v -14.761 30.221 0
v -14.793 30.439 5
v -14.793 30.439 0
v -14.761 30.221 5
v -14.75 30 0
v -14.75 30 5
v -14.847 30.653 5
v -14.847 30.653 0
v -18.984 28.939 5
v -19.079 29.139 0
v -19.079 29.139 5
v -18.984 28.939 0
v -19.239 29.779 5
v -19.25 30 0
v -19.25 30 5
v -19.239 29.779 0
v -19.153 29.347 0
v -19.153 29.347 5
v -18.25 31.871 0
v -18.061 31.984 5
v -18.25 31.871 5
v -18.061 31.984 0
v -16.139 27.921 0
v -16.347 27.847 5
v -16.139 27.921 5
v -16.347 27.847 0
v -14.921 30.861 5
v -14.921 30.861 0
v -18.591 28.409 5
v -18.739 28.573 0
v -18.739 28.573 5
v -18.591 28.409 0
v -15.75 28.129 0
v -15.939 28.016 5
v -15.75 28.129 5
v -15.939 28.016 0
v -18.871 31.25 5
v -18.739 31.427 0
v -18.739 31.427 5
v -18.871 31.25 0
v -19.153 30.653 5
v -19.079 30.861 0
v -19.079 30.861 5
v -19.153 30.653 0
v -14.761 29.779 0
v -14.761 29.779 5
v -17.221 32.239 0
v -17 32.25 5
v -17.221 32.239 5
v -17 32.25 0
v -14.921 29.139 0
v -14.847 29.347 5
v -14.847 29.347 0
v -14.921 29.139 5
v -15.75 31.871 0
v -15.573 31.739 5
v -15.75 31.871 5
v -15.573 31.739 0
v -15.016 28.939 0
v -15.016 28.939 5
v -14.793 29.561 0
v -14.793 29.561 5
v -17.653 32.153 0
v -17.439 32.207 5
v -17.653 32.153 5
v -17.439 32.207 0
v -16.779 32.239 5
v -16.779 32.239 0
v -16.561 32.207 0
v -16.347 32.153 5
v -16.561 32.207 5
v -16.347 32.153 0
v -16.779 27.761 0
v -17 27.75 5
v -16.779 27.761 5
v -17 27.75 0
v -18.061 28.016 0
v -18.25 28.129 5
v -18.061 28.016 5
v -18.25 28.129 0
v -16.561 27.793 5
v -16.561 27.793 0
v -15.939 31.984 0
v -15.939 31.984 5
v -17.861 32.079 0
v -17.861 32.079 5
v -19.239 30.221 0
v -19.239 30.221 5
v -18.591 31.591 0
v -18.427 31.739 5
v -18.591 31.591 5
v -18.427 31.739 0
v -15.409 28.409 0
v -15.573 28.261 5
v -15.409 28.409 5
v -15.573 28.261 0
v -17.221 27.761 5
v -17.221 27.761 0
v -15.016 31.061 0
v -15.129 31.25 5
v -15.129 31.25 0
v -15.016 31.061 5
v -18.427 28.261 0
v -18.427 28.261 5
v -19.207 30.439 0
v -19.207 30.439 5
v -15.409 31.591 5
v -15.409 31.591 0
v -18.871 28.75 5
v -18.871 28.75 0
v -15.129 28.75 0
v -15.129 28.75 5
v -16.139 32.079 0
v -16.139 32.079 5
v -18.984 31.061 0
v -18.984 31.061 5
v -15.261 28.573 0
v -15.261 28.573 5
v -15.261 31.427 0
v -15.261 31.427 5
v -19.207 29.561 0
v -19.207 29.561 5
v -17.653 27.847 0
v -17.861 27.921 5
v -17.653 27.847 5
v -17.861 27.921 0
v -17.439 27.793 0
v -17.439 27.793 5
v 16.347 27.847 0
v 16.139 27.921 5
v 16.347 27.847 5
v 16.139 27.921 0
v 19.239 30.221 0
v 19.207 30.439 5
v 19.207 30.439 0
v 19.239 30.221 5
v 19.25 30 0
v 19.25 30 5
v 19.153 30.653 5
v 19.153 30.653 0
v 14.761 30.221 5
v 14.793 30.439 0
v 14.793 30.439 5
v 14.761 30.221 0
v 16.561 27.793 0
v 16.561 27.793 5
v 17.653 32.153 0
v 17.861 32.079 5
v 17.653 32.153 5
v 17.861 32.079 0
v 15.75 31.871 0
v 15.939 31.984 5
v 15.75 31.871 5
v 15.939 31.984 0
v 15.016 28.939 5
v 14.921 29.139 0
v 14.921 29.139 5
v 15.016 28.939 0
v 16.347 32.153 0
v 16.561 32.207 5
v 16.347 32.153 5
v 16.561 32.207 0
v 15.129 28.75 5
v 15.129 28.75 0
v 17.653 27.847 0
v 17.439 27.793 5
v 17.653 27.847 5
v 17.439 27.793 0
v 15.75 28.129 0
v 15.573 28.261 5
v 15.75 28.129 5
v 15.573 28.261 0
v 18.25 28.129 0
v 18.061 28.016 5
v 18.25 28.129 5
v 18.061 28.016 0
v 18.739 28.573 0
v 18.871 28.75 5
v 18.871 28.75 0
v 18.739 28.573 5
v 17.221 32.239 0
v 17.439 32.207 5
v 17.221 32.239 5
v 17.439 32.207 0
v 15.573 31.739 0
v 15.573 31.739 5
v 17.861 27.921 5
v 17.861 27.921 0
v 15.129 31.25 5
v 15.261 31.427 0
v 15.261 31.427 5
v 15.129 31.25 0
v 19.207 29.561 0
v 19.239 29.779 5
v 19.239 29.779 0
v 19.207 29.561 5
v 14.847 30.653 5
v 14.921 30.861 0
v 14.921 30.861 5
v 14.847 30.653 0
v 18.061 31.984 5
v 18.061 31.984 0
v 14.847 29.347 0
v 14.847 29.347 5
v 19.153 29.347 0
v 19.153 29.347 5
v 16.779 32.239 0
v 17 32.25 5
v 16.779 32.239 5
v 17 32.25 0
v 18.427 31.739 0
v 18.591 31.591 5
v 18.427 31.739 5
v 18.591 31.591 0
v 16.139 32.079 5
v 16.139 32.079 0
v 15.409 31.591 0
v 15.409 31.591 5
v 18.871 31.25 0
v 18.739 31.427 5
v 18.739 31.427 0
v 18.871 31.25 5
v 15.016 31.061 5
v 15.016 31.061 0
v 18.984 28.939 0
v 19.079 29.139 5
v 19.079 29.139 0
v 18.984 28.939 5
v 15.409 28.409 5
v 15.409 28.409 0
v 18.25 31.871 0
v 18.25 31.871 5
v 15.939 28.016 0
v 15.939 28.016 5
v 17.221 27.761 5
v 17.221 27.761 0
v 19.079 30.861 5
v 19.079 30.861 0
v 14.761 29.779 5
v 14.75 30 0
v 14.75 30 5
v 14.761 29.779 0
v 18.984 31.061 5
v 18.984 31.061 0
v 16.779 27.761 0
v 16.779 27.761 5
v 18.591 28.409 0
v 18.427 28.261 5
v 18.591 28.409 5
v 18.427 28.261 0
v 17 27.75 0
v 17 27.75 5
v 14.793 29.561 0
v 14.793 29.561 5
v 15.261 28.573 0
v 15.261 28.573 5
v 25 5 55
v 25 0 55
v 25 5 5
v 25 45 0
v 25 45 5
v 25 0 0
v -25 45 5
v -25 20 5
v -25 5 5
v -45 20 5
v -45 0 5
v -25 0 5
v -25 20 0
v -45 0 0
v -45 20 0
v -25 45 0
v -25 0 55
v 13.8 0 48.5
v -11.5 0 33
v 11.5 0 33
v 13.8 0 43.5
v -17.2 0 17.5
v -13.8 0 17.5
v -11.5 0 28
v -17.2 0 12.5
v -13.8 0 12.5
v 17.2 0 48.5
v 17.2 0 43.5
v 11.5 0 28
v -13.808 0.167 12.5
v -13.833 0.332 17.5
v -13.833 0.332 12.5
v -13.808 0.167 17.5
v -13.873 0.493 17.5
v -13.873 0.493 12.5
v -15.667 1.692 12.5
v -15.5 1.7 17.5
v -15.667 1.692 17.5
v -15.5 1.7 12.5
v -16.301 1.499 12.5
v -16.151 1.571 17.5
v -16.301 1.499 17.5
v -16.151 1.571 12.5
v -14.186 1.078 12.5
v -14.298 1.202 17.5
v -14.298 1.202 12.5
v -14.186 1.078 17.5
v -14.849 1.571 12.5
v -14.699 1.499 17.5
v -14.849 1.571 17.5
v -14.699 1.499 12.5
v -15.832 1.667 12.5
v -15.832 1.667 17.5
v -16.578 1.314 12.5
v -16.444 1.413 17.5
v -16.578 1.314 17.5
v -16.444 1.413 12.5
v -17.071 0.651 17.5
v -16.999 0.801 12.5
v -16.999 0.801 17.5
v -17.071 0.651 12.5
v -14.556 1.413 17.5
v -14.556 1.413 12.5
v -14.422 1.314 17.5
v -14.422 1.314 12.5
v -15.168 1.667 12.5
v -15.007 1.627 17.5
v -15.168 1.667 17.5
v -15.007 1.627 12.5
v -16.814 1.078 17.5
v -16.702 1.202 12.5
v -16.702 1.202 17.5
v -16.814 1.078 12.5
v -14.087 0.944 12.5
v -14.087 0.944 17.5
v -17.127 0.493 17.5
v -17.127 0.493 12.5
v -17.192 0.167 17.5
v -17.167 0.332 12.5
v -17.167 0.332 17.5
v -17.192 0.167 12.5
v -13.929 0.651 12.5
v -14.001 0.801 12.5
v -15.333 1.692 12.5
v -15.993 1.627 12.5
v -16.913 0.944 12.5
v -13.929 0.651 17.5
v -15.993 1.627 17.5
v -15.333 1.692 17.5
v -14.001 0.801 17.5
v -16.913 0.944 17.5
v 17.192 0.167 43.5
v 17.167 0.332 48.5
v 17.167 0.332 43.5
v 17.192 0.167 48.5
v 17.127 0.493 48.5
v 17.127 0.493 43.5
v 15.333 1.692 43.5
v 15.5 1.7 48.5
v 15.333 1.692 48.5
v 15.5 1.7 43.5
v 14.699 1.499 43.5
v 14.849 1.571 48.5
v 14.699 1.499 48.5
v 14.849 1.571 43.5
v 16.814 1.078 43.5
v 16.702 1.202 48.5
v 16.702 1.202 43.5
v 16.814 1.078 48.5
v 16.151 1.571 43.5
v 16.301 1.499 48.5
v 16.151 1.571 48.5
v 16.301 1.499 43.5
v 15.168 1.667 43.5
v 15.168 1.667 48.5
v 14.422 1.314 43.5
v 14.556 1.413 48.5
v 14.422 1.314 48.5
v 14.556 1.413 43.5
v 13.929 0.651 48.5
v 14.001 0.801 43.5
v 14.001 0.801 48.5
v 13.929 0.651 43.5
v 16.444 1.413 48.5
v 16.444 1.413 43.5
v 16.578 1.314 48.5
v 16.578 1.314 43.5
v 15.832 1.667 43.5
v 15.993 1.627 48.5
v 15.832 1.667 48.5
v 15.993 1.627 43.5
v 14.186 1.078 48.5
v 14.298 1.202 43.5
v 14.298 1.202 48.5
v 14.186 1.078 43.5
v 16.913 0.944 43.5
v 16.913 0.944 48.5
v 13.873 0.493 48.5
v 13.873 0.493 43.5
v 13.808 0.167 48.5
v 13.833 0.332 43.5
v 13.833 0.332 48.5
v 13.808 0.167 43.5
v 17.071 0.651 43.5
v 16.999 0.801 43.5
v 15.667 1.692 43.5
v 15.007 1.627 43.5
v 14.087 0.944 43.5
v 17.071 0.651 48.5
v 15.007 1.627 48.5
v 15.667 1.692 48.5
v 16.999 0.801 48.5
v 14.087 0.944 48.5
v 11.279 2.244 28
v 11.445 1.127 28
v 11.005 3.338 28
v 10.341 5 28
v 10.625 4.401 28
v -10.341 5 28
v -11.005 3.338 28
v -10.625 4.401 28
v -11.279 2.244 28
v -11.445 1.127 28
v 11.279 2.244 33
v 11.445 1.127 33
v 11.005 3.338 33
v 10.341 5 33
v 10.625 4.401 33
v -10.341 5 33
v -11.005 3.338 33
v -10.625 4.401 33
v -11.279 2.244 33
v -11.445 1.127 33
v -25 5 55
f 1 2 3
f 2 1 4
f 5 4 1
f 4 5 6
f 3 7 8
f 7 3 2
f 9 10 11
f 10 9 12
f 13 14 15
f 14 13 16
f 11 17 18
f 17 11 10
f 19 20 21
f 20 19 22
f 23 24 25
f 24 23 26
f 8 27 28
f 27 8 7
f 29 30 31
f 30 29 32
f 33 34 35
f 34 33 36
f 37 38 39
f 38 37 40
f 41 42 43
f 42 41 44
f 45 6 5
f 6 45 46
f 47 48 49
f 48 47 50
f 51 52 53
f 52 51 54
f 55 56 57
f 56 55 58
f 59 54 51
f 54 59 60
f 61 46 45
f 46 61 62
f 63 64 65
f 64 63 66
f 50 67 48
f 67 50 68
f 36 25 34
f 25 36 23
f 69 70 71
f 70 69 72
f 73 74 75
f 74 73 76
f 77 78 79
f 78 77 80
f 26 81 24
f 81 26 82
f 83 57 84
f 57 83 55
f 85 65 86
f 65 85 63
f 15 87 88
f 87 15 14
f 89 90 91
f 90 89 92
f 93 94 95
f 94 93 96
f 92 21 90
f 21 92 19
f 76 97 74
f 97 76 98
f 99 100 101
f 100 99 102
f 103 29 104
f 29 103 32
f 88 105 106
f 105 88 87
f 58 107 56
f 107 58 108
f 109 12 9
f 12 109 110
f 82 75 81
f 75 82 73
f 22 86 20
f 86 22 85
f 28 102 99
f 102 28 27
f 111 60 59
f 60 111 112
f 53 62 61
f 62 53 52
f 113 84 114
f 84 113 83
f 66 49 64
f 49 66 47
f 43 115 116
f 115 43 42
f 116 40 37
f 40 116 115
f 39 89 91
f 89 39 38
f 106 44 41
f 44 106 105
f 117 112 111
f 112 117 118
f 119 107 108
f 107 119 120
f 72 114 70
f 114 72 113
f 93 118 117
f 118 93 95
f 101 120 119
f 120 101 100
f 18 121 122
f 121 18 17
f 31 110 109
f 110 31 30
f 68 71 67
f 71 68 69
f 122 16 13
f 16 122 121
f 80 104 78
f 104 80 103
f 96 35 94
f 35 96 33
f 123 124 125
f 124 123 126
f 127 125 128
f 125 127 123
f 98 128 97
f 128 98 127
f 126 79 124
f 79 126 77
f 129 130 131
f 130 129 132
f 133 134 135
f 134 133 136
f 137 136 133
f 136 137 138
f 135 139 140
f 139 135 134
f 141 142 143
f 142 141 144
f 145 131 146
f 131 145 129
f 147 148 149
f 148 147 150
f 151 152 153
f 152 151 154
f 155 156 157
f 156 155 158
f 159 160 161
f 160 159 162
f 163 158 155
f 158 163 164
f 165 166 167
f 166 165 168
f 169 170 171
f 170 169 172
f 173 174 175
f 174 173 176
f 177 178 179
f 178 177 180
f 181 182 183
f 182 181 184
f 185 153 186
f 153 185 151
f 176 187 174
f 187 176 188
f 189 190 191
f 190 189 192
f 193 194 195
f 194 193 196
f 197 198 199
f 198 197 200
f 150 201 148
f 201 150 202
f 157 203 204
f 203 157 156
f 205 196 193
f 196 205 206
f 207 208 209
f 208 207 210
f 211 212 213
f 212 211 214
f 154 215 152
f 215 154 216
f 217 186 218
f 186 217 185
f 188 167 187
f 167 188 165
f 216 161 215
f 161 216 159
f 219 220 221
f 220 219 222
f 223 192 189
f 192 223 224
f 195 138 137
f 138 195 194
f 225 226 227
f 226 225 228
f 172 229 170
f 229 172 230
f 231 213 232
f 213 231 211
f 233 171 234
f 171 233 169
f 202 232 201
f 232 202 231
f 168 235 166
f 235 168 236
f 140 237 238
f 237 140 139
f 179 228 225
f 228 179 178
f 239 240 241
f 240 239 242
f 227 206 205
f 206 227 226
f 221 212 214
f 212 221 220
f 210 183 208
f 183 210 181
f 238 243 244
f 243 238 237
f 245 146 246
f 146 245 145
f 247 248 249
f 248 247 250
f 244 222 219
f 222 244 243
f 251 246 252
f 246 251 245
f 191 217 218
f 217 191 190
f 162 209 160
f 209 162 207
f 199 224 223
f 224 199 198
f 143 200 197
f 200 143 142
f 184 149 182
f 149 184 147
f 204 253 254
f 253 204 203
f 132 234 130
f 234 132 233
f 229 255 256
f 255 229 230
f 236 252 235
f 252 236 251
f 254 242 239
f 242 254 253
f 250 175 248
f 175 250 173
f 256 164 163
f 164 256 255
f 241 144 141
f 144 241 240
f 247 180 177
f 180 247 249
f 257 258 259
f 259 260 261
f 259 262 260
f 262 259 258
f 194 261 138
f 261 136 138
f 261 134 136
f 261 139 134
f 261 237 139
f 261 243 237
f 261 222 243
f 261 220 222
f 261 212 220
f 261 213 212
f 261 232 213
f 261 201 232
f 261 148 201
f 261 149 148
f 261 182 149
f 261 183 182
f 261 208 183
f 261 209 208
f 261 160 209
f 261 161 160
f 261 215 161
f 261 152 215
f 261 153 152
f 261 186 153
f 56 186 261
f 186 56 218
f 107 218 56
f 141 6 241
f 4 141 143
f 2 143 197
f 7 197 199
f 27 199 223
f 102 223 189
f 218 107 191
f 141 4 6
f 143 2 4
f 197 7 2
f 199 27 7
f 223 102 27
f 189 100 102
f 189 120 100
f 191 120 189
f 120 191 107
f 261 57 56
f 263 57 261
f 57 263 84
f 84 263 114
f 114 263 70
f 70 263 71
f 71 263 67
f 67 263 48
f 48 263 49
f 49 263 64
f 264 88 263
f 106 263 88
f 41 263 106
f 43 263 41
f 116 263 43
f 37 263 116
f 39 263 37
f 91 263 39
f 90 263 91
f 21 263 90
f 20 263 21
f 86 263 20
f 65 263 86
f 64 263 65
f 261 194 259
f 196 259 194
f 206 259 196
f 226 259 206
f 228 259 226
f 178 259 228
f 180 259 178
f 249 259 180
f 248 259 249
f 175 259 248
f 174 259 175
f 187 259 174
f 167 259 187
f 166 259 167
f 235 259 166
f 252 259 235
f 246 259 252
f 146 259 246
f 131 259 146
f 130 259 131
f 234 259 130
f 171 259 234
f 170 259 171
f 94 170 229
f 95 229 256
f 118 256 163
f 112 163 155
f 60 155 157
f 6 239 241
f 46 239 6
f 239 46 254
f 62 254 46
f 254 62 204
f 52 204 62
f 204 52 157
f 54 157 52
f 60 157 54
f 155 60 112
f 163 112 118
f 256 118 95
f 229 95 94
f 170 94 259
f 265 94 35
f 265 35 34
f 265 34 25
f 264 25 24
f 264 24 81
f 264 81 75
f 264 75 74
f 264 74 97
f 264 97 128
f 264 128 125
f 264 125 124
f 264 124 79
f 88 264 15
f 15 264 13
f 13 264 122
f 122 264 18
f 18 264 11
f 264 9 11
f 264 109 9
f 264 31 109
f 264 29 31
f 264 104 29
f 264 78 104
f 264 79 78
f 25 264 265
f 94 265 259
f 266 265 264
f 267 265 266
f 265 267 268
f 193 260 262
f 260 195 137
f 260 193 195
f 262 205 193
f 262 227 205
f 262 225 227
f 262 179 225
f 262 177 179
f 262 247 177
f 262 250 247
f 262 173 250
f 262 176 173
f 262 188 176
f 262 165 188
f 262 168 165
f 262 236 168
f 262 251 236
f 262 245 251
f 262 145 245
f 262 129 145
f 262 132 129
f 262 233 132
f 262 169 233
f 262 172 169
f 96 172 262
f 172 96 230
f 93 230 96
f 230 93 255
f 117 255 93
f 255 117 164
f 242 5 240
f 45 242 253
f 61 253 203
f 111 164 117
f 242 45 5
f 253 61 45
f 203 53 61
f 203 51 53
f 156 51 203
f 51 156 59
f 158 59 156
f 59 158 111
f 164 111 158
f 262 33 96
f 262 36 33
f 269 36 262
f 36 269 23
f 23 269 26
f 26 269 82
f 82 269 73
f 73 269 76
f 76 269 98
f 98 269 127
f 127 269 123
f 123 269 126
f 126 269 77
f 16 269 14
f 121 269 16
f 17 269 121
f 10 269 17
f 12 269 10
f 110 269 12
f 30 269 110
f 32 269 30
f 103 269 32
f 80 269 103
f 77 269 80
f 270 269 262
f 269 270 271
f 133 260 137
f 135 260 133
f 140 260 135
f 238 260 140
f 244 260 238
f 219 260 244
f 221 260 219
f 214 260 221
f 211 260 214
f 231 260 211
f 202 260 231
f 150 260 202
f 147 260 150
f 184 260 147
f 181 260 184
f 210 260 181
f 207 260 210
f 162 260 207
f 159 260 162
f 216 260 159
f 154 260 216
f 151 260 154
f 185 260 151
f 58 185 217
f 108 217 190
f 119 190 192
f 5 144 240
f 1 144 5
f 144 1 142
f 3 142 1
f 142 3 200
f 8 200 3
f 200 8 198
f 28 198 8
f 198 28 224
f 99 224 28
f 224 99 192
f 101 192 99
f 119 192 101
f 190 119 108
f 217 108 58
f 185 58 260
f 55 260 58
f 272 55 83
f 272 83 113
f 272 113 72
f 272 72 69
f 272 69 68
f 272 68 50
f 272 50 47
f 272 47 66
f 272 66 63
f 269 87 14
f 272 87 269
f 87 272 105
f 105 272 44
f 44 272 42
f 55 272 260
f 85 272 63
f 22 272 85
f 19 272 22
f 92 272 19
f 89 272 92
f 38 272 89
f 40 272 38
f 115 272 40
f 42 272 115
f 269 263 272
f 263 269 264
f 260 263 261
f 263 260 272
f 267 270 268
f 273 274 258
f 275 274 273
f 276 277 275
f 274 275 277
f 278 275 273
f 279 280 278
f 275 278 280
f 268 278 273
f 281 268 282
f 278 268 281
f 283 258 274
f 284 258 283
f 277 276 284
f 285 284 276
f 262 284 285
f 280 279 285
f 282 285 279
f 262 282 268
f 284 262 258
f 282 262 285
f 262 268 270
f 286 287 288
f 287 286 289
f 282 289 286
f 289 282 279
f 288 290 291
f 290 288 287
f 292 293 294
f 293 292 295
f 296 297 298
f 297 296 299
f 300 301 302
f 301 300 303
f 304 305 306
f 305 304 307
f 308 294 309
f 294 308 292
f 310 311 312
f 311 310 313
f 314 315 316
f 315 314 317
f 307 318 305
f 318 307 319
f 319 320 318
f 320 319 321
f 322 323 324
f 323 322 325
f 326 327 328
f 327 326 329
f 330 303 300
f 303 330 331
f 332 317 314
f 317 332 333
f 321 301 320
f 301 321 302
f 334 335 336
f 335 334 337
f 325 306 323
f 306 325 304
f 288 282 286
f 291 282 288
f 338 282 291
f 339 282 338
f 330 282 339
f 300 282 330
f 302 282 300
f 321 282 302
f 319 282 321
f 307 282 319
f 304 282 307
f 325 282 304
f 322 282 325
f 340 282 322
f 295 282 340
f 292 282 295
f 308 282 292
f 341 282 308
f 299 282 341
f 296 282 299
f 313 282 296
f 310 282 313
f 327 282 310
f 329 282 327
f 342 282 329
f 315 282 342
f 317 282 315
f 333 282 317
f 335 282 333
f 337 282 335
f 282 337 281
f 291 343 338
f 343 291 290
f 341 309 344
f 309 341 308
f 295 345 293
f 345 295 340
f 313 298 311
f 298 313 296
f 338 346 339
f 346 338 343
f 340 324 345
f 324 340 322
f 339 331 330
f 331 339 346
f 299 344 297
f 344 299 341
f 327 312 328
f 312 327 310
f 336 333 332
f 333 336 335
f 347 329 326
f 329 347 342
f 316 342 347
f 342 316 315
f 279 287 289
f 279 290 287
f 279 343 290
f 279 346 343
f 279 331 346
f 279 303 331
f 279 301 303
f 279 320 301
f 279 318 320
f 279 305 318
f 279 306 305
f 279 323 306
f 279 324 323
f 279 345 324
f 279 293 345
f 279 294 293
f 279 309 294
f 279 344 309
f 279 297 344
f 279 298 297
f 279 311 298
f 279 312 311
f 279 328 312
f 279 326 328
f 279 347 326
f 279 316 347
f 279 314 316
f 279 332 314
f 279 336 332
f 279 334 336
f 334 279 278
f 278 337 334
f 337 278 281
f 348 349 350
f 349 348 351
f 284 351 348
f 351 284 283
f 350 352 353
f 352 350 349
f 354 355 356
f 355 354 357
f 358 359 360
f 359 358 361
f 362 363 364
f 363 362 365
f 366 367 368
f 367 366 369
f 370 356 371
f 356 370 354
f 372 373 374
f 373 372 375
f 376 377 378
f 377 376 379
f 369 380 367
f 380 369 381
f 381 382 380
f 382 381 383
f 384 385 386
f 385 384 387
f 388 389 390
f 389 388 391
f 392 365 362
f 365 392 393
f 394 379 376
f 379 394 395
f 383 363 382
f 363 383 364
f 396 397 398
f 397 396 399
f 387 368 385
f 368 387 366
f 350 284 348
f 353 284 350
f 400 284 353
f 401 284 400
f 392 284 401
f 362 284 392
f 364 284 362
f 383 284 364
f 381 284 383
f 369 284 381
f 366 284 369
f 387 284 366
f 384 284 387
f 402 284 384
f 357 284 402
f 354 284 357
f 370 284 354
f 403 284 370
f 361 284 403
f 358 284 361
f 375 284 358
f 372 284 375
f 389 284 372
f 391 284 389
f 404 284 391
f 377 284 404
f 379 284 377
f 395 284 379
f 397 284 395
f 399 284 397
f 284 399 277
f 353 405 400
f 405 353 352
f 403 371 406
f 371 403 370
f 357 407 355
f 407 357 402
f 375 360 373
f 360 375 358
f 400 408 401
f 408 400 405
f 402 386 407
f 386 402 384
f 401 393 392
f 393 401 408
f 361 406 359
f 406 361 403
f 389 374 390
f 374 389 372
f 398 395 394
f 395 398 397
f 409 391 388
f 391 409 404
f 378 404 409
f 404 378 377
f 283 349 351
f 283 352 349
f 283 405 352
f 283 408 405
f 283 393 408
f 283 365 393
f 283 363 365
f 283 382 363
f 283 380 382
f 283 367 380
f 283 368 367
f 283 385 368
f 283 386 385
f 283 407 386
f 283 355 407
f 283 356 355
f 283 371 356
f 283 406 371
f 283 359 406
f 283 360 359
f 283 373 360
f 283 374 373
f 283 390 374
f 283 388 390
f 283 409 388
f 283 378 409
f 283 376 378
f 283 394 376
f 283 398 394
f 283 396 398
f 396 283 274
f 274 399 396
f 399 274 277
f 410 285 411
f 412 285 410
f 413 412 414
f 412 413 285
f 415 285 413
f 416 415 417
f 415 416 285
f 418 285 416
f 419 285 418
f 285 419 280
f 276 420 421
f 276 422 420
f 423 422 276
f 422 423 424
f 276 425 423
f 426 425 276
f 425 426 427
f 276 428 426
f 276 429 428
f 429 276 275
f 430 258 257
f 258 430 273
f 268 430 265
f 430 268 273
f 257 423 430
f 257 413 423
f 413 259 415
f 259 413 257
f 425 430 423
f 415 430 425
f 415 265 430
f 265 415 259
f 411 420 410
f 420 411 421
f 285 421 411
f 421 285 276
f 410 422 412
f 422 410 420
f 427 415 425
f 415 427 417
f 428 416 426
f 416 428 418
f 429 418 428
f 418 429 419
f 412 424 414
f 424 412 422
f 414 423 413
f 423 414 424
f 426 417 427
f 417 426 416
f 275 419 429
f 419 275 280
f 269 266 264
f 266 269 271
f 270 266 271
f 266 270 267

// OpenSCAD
// L-shaped mounting bracket for NEMA 17 stepper motor.
// Base plate: 50x45x5 mm. Vertical plate: 50x5x50 mm.
// Includes M4 holes in base, motor boss hole, M3 screw holes, and gussets.

// Base dimensions
base_x = 50;
base_y = 45;
base_z = 5;

// Vertical plate dimensions
vert_x = 50;
vert_y = 5;
vert_z = 50;

// Hole positions and sizes
m4_x1 = -17;
m4_y1 = 30;
m4_x2 = 17;
m4_y2 = 30;
m4_d  = 4.5;

boss_x = 0;
boss_z = 28;
boss_d = 23;

m3_count = 4;
m3_d    = 3.4;
m3_pat  = 31; // square pattern size

// Gusset dimensions
gusset_x_start = -25;
gusset_x_end   = -20;
gusset_x2_start = 20;
gusset_x2_end   = 25;
gusset_y_leg = 20;
gusset_z_leg = 20;
gusset_t     = 5;

$fn = 64;

// Base plate
difference() {
    translate([-base_x / 2, 0, 0]) cube([base_x, base_y, base_z]);
    
    // M4 holes (extend slightly past base thickness)
    for (i = [0 : 1]) {
        translate([
            i == 0 ? m4_x1 : m4_x2,
            m4_y1,
            -0.1
        ]) cylinder(h = base_z + 0.2, d = m4_d);
    }
}

// Vertical plate
difference() {
    // Main body of vertical plate
    translate([-vert_x / 2, 0, base_z]) cube([vert_x, vert_y, vert_z]);
    
    // Boss hole (along Y axis)
    translate([boss_x, 0, boss_z]) cylinder(h = vert_y, d = boss_d);
    
    // M3 screw holes (square pattern centred on boss)
    // Pattern: 31mm square, centred at x=0, z=28.
    // Points: (-15.5, 0, 12.5), (-15.5, 0, 43.5), (15.5, 0, 12.5), (15.5, 0, 43.5)
    
    for (i = [0 : 3]) {
        translate([
            i == 0 ? -15.5 : (i == 1 ? 15.5 : 0),
            0,
            i == 0 ? 12.5 : (i == 1 ? 43.5 : 28)
        ]) cylinder(h = vert_y, d = m3_d);
    }
}

// Gussets (Right triangles in YZ plane, extruded along X)
// Left Gusset
translate([gusset_x_start, 0, 0]) {
    rotate([0, 0, 90]) // Face YZ plane
    linear_extrude(height = gusset_x_end - gusset_x_start)
    polygon([
        [0, 0],       // (y=0, z=0) - bottom left
        [gusset_y_leg, 0], // (y=20, z=0) - bottom right
        [gusset_y_leg, gusset_z_leg], // (y=20, z=20) - top right
        [0, gusset_z_leg]  // (y=0, z=20) - top left
    ]);
}

// Right Gusset
translate([gusset_x2_start, 0, 0]) {
    rotate([0, 0, 90]) // Face YZ plane
    linear_extrude(height = gusset_x2_end - gusset_x2_start)
    polygon([
        [0, 0],       // (y=0, z=0)
        [gusset_y_leg, 0], // (y=20, z=0)
        [gusset_y_leg, gusset_z_leg], // (y=20, z=20)
        [0, gusset_z_leg]  // (y=0, z=20)
    ]);
}
